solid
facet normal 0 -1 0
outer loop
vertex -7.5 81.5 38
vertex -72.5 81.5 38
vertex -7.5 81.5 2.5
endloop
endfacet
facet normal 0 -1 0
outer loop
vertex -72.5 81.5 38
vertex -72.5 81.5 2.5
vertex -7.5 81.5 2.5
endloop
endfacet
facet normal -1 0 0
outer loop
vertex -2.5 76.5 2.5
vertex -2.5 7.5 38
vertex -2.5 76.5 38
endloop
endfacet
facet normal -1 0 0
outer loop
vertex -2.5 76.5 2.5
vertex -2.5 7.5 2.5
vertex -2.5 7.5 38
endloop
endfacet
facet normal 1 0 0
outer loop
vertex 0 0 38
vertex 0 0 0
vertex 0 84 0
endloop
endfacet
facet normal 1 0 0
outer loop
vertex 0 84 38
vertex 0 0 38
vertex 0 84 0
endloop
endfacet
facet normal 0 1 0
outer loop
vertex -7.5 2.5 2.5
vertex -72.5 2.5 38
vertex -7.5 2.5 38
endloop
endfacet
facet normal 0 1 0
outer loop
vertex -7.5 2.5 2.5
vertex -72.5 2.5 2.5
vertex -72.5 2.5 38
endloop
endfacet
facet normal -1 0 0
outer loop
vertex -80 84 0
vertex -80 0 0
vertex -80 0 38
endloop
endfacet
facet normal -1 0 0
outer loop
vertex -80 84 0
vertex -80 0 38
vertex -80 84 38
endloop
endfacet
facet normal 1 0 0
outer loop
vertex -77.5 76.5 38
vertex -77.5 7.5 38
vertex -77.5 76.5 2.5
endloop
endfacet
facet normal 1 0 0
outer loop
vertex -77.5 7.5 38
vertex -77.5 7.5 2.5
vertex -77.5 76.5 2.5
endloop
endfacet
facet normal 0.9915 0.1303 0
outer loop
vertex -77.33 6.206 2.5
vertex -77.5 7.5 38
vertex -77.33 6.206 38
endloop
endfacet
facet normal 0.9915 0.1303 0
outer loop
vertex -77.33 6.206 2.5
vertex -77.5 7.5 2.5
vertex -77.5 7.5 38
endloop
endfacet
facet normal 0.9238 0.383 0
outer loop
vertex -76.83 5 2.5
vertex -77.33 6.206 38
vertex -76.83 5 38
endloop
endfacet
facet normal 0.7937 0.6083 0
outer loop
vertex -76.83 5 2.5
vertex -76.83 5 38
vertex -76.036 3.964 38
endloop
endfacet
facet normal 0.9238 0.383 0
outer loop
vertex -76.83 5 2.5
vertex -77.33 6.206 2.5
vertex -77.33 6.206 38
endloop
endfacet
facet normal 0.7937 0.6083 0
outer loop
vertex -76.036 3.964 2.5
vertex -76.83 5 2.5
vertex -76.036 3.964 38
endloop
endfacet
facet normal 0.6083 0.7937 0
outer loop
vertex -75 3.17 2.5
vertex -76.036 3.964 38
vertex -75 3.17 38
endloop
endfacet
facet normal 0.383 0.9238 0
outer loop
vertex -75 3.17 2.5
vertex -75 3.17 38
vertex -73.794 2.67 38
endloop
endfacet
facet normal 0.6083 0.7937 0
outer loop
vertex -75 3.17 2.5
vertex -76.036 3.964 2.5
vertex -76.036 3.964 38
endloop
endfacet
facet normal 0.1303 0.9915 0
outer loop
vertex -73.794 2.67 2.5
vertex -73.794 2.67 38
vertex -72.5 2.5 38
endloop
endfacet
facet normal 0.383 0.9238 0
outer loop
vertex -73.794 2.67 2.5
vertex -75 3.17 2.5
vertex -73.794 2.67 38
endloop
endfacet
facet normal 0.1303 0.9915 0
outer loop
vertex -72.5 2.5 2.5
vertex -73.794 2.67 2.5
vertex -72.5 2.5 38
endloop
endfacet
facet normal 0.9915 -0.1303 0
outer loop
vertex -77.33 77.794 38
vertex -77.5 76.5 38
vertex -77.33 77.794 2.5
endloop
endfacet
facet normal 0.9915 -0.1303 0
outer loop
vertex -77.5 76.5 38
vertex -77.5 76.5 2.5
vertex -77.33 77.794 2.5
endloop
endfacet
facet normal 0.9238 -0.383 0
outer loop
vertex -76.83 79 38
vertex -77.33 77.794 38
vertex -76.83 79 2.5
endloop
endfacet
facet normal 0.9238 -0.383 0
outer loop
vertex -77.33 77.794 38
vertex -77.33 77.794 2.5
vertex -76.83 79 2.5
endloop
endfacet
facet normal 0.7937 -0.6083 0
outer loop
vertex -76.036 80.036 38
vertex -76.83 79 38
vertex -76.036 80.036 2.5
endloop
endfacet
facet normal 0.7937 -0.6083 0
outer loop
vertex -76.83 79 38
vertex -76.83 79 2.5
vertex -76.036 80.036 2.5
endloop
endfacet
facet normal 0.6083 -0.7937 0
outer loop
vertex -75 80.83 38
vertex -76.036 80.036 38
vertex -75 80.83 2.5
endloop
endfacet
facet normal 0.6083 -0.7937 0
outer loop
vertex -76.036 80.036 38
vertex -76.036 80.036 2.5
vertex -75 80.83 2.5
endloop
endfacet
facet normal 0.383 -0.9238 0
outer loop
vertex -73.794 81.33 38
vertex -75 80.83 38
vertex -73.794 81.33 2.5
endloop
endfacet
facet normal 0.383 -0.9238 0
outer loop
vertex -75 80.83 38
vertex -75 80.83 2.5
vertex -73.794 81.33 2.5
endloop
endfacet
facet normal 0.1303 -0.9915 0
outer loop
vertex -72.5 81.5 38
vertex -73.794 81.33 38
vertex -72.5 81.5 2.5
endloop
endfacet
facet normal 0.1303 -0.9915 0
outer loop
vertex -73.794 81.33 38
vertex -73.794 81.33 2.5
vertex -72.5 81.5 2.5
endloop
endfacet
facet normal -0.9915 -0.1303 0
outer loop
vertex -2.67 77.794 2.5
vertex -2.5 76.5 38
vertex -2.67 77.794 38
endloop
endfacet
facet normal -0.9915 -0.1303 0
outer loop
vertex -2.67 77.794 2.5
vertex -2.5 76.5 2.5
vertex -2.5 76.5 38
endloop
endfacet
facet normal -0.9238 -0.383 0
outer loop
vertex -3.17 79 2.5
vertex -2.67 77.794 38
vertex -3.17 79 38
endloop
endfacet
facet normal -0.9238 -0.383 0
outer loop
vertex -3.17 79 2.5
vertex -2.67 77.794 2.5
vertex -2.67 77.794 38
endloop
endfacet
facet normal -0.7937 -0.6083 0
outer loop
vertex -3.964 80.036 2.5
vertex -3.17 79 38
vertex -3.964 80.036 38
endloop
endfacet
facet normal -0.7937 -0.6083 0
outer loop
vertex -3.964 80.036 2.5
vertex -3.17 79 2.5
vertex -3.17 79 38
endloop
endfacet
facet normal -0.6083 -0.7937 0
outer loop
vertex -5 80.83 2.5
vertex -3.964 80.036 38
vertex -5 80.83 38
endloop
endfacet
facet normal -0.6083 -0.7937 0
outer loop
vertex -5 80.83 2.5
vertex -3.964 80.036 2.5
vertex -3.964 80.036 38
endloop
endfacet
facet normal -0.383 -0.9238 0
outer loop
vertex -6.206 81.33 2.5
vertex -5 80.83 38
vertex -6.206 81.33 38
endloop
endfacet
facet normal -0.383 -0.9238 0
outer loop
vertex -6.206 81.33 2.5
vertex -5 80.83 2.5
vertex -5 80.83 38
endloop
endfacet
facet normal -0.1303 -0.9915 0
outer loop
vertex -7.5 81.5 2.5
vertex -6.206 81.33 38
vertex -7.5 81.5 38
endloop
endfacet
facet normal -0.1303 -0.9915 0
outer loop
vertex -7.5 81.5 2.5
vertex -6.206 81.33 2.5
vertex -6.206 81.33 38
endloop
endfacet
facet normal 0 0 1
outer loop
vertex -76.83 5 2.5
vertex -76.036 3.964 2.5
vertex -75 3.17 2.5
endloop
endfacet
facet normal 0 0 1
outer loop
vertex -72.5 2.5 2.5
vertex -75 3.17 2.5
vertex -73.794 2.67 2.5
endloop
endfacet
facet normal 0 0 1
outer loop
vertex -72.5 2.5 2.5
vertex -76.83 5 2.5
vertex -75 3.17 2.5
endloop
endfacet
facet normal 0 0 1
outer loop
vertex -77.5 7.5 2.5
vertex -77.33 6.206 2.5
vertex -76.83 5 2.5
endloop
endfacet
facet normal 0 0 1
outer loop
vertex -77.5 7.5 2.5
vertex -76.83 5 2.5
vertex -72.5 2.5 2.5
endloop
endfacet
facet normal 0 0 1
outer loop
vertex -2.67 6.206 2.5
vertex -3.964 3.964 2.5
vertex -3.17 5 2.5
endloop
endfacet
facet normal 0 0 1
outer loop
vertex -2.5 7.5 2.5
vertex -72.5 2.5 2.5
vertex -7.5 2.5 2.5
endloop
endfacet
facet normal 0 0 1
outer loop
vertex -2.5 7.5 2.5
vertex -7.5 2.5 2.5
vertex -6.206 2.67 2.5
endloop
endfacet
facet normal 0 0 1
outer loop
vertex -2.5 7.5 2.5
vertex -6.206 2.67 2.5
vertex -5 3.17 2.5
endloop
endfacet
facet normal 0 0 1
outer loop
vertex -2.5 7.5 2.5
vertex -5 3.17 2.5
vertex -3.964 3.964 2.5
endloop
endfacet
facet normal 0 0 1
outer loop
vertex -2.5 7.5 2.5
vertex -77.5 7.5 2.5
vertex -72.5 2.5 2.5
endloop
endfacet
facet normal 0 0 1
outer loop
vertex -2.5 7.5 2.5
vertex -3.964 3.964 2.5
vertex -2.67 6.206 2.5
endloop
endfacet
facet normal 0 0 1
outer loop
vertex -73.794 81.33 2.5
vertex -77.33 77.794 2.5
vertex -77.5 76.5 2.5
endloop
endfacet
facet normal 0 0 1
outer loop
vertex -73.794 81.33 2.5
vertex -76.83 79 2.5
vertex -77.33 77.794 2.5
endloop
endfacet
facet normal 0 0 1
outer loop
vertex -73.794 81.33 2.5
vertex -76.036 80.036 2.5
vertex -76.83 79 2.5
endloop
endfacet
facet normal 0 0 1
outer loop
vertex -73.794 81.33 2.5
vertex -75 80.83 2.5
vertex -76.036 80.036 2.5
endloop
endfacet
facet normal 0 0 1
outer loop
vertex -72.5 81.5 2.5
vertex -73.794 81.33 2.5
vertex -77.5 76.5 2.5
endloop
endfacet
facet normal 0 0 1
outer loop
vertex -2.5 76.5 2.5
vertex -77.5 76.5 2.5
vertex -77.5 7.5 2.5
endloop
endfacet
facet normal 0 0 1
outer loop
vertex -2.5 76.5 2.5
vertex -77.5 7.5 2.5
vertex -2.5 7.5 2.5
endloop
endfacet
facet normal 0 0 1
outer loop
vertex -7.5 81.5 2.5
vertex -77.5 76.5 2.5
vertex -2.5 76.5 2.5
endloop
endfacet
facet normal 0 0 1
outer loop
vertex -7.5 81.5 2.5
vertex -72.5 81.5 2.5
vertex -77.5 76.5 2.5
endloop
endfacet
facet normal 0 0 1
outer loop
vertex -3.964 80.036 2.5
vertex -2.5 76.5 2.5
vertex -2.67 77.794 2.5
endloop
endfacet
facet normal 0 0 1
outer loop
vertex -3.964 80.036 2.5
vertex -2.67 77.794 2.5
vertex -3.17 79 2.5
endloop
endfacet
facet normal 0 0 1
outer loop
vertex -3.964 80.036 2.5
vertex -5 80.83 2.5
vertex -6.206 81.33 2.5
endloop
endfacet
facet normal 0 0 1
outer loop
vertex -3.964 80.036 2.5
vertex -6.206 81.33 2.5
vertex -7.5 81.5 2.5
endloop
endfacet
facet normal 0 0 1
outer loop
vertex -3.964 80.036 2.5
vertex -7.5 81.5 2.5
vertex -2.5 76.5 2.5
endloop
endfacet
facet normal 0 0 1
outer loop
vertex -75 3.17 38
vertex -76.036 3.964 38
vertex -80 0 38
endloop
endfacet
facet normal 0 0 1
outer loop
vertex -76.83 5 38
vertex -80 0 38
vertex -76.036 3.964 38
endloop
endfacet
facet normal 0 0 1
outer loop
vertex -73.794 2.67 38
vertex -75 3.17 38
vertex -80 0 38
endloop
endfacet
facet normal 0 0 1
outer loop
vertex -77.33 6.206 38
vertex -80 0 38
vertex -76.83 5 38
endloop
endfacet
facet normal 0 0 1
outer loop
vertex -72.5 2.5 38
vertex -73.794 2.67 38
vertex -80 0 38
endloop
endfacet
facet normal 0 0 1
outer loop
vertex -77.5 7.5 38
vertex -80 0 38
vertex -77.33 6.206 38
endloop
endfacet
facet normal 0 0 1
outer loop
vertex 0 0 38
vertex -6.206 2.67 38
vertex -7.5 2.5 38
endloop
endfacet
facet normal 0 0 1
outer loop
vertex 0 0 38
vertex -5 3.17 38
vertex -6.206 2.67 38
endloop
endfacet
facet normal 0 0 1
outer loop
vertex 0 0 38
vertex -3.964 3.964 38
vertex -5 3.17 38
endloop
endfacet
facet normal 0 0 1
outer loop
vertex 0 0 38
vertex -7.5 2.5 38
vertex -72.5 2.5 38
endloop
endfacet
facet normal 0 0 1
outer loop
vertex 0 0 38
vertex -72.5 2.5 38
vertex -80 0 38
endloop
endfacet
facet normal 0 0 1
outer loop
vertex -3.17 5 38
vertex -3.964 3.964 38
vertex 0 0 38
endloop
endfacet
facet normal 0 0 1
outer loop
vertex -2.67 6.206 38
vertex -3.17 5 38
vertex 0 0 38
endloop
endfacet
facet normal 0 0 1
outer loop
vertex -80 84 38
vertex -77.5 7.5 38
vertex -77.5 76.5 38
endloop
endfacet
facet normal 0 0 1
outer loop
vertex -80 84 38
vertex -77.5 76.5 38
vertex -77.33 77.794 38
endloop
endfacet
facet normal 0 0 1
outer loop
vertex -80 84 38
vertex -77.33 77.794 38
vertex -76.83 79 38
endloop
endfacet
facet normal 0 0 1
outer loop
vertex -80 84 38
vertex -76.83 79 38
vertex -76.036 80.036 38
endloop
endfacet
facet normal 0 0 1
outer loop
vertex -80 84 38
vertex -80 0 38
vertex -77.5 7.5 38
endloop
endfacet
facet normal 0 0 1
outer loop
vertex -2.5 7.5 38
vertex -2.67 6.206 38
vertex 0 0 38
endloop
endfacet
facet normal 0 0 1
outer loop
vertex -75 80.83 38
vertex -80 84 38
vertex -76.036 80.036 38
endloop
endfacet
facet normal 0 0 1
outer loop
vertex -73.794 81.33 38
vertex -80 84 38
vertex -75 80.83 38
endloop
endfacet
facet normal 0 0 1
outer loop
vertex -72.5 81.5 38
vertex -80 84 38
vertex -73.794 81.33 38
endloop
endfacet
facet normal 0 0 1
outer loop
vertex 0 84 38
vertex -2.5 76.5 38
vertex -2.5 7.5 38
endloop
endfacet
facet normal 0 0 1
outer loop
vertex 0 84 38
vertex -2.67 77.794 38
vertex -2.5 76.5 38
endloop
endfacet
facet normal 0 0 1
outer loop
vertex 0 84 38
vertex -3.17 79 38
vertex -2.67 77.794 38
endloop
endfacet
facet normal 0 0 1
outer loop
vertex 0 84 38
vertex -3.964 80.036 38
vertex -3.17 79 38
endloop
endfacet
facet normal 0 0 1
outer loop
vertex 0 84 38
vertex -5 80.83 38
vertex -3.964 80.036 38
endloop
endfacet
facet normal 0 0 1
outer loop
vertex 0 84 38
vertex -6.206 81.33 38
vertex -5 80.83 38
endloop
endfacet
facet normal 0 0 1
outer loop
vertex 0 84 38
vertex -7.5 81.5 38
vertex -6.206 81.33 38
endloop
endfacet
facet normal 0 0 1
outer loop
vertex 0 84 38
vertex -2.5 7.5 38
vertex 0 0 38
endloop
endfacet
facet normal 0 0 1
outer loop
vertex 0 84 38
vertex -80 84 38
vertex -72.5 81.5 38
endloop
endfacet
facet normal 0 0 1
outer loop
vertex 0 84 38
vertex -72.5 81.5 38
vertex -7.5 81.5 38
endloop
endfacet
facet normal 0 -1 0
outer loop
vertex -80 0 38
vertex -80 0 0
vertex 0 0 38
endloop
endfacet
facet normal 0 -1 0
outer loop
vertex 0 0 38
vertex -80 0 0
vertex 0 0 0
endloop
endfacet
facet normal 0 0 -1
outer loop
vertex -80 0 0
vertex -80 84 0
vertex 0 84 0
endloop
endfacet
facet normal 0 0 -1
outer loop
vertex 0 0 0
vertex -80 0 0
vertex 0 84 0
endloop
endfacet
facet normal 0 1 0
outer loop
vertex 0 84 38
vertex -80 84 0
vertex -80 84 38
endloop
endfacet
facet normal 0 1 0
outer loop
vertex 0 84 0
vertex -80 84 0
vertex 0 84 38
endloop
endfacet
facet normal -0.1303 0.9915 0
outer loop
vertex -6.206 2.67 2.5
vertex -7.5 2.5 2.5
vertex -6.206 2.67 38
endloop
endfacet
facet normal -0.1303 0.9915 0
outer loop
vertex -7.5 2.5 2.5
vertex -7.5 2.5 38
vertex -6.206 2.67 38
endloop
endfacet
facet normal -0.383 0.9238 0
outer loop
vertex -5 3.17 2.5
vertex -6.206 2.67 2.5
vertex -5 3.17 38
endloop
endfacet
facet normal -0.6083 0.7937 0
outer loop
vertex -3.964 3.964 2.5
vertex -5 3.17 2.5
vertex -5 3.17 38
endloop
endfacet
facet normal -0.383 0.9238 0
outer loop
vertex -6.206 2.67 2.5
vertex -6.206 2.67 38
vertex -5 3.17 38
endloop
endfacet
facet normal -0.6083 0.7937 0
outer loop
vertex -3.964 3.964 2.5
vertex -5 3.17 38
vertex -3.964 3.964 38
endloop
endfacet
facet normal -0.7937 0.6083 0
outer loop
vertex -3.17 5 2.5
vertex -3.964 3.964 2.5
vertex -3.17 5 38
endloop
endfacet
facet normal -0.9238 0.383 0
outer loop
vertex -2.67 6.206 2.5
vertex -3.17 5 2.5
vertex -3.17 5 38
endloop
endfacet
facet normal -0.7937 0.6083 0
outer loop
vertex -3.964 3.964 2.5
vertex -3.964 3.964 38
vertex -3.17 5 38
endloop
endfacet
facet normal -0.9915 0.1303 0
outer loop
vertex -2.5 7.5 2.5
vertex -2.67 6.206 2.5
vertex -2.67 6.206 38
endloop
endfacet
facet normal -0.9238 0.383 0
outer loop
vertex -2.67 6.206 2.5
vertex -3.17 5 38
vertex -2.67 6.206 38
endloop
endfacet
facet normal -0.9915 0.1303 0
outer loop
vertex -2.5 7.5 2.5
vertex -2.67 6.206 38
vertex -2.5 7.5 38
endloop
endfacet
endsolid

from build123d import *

# Parameters (mm, degrees)
F0_W     = 80
F0_H     = 84
F1_DEPTH = 38
F2_T     = -2.5
F3_R     = 5


with BuildPart() as f1:
    # F0 (on Top) → F1 (new body)
    with BuildSketch(Plane.XY):
        with Locations((-40, 42)):
            Rectangle(F0_W, F0_H)
    extrude(amount=F1_DEPTH)

    # F2
    f2_openings = [f1.faces().sort_by_distance(p)[0] for p in [
        (-40, 42, 38),
    ]]
    offset(amount=F2_T, openings=f2_openings)

    # F3
    f3_edges = [f1.edges().sort_by_distance(p)[0] for p in [
        (-77.5, 81.5, 20.25),
        (-2.5, 81.5, 20.25),
        (-2.5, 2.5, 20.25),
        (-77.5, 2.5, 20.25),
    ]]
    fillet(f3_edges, radius=F3_R)


solid = f1.part
